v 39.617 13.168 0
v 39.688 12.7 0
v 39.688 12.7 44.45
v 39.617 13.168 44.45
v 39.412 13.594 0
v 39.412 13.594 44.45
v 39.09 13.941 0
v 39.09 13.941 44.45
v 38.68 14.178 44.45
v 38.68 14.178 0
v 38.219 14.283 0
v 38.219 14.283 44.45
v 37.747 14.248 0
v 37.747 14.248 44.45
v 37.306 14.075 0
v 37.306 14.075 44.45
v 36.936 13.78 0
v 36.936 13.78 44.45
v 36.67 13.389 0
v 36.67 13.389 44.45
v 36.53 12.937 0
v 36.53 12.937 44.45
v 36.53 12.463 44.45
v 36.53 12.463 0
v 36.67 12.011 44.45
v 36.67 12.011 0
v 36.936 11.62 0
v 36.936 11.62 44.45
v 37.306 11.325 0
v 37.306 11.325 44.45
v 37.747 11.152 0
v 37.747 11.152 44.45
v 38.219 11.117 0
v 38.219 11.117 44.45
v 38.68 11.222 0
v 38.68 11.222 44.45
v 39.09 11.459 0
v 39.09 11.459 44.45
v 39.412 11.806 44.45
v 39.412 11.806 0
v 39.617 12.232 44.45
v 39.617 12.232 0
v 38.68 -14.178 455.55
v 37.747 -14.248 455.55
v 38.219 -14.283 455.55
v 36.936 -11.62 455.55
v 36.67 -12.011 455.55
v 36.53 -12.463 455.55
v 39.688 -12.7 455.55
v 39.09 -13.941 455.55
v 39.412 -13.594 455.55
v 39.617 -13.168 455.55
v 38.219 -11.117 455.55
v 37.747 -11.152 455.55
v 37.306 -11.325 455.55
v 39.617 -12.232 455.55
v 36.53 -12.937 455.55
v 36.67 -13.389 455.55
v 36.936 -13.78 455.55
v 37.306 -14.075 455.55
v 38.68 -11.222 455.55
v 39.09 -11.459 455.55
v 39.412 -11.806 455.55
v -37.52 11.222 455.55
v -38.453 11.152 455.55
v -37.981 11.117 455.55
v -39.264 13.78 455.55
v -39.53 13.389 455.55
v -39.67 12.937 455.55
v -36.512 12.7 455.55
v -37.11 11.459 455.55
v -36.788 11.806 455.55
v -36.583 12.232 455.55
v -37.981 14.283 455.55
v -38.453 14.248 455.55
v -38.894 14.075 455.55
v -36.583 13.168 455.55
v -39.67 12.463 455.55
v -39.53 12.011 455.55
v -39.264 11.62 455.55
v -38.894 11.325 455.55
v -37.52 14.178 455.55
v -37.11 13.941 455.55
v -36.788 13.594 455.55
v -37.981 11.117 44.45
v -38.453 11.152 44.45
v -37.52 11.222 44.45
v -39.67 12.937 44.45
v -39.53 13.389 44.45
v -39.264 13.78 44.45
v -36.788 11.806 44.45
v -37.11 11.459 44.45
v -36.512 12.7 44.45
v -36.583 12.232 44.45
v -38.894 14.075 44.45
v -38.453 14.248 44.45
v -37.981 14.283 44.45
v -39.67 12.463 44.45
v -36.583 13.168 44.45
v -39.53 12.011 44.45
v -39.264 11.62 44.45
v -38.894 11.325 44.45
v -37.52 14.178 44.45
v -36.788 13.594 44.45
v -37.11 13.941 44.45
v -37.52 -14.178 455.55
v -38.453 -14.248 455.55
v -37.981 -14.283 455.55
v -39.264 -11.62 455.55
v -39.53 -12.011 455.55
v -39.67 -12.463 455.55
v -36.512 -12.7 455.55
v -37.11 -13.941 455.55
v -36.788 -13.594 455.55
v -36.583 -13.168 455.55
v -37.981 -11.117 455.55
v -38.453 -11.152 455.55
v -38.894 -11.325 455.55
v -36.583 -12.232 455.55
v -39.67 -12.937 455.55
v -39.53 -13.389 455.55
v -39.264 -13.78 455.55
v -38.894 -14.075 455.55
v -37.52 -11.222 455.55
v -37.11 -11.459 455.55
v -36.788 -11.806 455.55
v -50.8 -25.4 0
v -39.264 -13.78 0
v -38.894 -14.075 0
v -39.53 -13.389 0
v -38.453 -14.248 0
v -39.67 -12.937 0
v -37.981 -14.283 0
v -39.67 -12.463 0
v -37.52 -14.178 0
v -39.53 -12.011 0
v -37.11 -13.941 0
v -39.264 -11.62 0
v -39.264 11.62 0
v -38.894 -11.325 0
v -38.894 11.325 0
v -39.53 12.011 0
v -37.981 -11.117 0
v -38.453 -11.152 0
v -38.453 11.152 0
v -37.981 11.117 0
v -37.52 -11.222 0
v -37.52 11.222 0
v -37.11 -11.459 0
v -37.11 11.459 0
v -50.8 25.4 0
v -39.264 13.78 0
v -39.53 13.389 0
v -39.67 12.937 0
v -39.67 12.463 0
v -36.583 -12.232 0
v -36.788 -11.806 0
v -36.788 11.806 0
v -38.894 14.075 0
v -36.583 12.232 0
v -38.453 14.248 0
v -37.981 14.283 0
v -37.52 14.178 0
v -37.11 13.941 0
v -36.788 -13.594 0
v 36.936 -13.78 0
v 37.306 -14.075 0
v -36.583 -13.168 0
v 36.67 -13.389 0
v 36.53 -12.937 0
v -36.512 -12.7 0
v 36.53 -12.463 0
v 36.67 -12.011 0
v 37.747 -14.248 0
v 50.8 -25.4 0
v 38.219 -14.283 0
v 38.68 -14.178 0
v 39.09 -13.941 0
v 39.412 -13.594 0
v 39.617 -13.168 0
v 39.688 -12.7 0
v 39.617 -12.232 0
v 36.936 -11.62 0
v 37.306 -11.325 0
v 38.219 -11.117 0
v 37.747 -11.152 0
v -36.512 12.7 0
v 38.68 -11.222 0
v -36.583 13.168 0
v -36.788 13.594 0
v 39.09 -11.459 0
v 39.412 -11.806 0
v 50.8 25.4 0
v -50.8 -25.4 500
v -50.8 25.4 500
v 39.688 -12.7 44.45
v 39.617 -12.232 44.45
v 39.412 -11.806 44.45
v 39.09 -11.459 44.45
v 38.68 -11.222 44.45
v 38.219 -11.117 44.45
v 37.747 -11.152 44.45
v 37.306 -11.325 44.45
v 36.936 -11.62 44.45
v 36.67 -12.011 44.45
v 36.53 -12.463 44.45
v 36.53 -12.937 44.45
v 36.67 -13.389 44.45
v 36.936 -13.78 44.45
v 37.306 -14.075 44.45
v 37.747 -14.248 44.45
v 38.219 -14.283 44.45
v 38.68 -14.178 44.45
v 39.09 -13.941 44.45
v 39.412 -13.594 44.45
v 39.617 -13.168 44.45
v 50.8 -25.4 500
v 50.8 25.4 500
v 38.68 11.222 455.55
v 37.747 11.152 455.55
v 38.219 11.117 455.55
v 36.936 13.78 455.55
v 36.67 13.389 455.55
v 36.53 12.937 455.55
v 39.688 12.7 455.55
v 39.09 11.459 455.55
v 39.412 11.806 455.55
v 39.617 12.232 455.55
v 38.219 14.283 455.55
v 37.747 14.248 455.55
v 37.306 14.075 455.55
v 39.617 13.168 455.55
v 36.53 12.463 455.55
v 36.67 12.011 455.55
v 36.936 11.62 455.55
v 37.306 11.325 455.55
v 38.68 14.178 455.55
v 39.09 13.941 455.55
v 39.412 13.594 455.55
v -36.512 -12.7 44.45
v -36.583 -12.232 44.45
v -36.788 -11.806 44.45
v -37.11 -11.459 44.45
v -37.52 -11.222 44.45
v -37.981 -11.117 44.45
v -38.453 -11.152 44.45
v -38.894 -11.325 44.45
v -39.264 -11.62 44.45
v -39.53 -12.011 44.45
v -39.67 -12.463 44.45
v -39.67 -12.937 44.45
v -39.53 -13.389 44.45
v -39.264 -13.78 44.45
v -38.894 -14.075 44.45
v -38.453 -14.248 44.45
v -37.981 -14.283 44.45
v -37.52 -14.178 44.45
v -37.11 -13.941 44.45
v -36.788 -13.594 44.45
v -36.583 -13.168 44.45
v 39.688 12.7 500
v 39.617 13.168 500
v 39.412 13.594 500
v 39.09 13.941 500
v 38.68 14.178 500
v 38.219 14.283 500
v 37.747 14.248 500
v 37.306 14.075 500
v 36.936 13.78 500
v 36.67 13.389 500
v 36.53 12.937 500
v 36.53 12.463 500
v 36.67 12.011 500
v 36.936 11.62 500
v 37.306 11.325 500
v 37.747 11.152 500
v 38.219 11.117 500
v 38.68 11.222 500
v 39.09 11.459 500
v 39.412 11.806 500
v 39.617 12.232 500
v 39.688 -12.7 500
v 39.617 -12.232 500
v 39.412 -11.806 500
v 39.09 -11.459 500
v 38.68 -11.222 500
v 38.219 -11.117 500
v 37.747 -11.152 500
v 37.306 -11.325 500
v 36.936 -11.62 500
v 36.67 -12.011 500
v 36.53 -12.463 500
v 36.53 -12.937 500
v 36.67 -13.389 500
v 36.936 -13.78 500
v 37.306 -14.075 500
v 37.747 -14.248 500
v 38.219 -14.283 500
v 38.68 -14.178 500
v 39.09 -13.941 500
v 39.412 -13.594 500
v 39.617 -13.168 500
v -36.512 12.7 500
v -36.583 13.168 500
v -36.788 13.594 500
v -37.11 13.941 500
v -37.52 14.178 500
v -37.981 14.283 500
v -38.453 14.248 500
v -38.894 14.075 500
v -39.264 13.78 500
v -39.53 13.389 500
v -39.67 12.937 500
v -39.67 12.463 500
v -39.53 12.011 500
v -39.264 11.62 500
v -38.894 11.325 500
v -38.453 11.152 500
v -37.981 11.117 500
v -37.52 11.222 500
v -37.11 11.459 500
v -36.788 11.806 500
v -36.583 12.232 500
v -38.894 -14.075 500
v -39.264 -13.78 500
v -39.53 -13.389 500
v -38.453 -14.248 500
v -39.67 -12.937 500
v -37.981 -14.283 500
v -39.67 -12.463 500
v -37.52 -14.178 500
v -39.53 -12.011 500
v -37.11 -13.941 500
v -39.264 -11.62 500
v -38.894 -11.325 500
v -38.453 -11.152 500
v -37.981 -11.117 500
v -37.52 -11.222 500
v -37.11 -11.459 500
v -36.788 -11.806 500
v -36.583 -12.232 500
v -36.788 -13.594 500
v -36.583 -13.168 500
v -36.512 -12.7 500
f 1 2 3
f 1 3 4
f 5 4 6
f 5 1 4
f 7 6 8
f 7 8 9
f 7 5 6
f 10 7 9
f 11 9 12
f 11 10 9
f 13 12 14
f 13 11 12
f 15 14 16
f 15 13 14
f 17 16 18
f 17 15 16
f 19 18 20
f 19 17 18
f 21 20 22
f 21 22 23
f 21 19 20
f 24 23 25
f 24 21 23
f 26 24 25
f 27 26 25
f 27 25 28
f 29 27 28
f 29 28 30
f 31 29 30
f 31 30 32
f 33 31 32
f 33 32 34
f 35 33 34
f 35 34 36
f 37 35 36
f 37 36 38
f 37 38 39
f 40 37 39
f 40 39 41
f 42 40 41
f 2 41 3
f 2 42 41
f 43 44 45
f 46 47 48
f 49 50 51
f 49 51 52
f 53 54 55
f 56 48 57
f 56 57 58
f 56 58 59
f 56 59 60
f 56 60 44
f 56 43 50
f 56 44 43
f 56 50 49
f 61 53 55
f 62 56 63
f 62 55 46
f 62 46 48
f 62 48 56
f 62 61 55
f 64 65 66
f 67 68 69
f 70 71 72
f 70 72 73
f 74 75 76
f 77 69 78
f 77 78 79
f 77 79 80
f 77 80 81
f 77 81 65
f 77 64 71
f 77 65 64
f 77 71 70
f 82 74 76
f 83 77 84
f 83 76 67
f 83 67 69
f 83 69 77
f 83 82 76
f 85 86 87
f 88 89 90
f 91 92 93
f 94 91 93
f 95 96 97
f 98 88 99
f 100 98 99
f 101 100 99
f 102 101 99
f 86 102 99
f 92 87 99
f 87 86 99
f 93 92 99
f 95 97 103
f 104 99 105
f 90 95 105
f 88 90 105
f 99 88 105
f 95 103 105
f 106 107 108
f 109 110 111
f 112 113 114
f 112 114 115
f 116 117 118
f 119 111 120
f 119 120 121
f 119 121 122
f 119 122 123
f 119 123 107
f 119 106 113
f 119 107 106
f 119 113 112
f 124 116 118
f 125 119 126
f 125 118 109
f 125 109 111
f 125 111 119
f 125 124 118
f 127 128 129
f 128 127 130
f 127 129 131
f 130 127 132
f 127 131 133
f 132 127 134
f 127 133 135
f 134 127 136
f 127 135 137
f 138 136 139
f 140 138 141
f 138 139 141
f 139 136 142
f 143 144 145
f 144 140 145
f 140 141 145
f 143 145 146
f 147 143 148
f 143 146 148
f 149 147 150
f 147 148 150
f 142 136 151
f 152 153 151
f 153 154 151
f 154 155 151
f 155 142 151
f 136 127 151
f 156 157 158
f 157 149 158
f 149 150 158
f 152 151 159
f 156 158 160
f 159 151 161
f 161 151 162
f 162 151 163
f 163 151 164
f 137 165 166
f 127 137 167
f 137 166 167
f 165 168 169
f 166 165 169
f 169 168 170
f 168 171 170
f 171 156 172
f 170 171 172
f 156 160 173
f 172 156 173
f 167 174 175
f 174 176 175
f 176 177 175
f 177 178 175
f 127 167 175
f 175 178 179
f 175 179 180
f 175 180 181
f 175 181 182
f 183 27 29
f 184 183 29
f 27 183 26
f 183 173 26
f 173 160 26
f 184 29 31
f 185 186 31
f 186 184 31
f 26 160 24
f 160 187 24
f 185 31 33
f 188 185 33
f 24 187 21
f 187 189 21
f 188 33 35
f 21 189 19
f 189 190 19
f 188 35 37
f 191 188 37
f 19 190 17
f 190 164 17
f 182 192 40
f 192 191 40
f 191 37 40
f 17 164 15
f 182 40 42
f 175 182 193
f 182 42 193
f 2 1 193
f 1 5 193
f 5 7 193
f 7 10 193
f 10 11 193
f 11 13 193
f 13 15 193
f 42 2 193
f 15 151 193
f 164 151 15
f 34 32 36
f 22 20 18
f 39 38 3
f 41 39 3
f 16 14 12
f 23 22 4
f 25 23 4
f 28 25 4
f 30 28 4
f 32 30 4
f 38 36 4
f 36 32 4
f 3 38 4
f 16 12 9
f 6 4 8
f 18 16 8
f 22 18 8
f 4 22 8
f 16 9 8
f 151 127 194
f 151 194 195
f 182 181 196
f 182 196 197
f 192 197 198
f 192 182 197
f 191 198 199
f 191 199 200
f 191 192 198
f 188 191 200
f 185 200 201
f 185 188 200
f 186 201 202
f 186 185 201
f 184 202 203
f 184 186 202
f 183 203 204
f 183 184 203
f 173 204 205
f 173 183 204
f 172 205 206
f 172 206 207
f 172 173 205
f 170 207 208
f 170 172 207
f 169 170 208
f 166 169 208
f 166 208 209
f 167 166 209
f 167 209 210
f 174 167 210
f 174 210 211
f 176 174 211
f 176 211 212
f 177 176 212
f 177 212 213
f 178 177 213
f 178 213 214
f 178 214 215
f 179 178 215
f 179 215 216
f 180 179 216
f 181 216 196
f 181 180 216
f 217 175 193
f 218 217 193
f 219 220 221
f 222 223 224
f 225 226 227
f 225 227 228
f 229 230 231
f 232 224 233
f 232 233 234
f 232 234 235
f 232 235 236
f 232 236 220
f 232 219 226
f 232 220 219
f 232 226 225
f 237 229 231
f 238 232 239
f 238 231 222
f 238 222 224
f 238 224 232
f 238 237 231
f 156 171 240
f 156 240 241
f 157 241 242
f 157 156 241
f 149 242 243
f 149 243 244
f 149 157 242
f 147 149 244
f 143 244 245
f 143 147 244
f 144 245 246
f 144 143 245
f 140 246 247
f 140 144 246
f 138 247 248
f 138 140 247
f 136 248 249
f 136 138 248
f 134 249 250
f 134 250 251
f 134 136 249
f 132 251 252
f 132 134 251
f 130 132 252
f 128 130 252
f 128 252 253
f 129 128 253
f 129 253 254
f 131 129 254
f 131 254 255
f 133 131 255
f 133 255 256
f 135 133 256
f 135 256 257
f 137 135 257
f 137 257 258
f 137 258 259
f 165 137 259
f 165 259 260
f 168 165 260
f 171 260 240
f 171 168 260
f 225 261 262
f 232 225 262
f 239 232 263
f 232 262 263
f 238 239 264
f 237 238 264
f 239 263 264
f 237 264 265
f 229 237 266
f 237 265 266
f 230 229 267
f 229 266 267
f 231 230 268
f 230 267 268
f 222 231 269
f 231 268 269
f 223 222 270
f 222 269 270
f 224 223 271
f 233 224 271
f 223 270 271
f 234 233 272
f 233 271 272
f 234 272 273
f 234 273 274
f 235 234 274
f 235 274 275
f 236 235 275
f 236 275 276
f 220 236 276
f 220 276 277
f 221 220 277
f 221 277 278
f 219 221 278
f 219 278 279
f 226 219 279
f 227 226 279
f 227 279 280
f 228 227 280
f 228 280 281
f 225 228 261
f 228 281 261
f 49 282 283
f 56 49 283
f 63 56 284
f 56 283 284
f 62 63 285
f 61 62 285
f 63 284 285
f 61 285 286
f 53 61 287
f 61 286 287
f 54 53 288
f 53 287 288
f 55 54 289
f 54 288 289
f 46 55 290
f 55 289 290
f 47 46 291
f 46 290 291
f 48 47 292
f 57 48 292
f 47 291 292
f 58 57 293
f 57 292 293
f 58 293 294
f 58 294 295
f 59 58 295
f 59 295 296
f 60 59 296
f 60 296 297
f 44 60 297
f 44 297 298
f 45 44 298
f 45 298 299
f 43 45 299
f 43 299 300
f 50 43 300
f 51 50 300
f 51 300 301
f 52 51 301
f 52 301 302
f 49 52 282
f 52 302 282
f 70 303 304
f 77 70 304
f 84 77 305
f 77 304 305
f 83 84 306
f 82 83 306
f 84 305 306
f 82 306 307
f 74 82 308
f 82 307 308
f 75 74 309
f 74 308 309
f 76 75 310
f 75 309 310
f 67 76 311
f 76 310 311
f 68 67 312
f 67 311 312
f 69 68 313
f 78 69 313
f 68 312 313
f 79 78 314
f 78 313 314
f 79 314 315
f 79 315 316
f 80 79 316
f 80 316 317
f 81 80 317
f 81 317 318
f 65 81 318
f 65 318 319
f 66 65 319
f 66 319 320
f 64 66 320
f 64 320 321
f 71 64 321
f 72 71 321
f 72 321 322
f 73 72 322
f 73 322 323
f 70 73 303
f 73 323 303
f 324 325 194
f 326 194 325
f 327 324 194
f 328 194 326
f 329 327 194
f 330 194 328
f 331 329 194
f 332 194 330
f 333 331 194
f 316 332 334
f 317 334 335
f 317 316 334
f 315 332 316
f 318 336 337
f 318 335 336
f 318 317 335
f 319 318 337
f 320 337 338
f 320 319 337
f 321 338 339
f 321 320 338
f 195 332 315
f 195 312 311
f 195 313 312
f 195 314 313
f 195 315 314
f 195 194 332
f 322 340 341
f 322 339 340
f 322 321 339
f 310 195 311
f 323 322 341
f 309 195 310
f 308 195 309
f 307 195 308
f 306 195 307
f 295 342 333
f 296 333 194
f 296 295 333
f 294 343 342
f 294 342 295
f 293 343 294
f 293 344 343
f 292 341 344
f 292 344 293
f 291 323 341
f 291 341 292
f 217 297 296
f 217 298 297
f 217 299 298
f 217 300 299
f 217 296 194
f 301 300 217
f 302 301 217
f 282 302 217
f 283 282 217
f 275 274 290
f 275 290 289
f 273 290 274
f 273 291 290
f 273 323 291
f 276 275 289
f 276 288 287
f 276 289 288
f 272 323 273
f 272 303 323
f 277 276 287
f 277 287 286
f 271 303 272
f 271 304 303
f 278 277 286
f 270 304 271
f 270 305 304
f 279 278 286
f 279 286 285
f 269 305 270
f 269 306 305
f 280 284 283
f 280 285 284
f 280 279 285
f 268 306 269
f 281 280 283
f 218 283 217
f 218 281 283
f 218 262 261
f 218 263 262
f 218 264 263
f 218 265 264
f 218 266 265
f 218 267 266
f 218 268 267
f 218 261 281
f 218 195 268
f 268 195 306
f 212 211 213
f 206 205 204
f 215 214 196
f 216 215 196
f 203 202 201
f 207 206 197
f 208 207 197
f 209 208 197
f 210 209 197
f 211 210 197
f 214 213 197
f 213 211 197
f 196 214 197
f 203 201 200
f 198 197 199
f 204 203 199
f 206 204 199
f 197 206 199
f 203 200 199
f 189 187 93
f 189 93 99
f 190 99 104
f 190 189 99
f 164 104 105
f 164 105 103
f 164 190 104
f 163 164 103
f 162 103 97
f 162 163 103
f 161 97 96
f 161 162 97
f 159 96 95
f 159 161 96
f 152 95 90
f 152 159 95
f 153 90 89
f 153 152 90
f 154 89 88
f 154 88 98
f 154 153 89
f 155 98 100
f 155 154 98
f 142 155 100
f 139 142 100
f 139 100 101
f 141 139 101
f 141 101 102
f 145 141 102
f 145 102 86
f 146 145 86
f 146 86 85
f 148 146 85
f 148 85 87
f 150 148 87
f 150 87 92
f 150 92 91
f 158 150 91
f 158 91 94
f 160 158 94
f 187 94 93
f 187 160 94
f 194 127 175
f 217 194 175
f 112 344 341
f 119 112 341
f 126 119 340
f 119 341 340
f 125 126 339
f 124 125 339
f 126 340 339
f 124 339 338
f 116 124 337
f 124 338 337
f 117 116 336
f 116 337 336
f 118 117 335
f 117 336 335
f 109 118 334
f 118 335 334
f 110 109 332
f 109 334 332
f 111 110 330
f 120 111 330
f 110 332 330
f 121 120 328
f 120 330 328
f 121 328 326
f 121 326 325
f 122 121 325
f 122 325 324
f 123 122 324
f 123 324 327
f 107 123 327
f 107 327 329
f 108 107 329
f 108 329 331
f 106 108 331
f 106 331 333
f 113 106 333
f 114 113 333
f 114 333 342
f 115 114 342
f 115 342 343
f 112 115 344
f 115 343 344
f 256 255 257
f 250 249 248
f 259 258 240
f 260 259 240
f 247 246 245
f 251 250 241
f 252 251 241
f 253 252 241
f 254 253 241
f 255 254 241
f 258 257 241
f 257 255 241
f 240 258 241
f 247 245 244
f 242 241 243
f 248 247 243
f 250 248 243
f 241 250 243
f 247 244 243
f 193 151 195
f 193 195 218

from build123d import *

# Parameters (mm, degrees)
SKETCH1_W           = 101.6
SKETCH1_H           = 50.8
BOSS_EXTRUDE1_DEPTH = 500
SKETCH2_R           = 1.5875
CUT_EXTRUDE1_DEPTH  = 44.45


with BuildPart() as part:
    # Sketch1 → Boss-Extrude1 (new body)
    with BuildSketch(Plane.XY):
        Rectangle(SKETCH1_W, SKETCH1_H)
    extrude(amount=BOSS_EXTRUDE1_DEPTH)

    # Sketch2 → Cut-Extrude1 (cut)
    with BuildSketch(Plane.XY.offset(500)):
        with Locations((-38.1, 12.7)):
            Circle(SKETCH2_R)
        with Locations((38.1, 12.7)):
            Circle(SKETCH2_R)
        with Locations((38.1, -12.7)):
            Circle(SKETCH2_R)
        with Locations((-38.1, -12.7)):
            Circle(SKETCH2_R)
    cut_extrude1 = extrude(amount=-CUT_EXTRUDE1_DEPTH, mode=Mode.SUBTRACT)

    # Mirror1: Cut-Extrude1 across plane
    add(cut_extrude1.mirror(Plane(origin=(0, 0, 250), x_dir=(1, 0, 0), z_dir=(0, 0, -1))), mode=Mode.SUBTRACT)


solid = part.part
